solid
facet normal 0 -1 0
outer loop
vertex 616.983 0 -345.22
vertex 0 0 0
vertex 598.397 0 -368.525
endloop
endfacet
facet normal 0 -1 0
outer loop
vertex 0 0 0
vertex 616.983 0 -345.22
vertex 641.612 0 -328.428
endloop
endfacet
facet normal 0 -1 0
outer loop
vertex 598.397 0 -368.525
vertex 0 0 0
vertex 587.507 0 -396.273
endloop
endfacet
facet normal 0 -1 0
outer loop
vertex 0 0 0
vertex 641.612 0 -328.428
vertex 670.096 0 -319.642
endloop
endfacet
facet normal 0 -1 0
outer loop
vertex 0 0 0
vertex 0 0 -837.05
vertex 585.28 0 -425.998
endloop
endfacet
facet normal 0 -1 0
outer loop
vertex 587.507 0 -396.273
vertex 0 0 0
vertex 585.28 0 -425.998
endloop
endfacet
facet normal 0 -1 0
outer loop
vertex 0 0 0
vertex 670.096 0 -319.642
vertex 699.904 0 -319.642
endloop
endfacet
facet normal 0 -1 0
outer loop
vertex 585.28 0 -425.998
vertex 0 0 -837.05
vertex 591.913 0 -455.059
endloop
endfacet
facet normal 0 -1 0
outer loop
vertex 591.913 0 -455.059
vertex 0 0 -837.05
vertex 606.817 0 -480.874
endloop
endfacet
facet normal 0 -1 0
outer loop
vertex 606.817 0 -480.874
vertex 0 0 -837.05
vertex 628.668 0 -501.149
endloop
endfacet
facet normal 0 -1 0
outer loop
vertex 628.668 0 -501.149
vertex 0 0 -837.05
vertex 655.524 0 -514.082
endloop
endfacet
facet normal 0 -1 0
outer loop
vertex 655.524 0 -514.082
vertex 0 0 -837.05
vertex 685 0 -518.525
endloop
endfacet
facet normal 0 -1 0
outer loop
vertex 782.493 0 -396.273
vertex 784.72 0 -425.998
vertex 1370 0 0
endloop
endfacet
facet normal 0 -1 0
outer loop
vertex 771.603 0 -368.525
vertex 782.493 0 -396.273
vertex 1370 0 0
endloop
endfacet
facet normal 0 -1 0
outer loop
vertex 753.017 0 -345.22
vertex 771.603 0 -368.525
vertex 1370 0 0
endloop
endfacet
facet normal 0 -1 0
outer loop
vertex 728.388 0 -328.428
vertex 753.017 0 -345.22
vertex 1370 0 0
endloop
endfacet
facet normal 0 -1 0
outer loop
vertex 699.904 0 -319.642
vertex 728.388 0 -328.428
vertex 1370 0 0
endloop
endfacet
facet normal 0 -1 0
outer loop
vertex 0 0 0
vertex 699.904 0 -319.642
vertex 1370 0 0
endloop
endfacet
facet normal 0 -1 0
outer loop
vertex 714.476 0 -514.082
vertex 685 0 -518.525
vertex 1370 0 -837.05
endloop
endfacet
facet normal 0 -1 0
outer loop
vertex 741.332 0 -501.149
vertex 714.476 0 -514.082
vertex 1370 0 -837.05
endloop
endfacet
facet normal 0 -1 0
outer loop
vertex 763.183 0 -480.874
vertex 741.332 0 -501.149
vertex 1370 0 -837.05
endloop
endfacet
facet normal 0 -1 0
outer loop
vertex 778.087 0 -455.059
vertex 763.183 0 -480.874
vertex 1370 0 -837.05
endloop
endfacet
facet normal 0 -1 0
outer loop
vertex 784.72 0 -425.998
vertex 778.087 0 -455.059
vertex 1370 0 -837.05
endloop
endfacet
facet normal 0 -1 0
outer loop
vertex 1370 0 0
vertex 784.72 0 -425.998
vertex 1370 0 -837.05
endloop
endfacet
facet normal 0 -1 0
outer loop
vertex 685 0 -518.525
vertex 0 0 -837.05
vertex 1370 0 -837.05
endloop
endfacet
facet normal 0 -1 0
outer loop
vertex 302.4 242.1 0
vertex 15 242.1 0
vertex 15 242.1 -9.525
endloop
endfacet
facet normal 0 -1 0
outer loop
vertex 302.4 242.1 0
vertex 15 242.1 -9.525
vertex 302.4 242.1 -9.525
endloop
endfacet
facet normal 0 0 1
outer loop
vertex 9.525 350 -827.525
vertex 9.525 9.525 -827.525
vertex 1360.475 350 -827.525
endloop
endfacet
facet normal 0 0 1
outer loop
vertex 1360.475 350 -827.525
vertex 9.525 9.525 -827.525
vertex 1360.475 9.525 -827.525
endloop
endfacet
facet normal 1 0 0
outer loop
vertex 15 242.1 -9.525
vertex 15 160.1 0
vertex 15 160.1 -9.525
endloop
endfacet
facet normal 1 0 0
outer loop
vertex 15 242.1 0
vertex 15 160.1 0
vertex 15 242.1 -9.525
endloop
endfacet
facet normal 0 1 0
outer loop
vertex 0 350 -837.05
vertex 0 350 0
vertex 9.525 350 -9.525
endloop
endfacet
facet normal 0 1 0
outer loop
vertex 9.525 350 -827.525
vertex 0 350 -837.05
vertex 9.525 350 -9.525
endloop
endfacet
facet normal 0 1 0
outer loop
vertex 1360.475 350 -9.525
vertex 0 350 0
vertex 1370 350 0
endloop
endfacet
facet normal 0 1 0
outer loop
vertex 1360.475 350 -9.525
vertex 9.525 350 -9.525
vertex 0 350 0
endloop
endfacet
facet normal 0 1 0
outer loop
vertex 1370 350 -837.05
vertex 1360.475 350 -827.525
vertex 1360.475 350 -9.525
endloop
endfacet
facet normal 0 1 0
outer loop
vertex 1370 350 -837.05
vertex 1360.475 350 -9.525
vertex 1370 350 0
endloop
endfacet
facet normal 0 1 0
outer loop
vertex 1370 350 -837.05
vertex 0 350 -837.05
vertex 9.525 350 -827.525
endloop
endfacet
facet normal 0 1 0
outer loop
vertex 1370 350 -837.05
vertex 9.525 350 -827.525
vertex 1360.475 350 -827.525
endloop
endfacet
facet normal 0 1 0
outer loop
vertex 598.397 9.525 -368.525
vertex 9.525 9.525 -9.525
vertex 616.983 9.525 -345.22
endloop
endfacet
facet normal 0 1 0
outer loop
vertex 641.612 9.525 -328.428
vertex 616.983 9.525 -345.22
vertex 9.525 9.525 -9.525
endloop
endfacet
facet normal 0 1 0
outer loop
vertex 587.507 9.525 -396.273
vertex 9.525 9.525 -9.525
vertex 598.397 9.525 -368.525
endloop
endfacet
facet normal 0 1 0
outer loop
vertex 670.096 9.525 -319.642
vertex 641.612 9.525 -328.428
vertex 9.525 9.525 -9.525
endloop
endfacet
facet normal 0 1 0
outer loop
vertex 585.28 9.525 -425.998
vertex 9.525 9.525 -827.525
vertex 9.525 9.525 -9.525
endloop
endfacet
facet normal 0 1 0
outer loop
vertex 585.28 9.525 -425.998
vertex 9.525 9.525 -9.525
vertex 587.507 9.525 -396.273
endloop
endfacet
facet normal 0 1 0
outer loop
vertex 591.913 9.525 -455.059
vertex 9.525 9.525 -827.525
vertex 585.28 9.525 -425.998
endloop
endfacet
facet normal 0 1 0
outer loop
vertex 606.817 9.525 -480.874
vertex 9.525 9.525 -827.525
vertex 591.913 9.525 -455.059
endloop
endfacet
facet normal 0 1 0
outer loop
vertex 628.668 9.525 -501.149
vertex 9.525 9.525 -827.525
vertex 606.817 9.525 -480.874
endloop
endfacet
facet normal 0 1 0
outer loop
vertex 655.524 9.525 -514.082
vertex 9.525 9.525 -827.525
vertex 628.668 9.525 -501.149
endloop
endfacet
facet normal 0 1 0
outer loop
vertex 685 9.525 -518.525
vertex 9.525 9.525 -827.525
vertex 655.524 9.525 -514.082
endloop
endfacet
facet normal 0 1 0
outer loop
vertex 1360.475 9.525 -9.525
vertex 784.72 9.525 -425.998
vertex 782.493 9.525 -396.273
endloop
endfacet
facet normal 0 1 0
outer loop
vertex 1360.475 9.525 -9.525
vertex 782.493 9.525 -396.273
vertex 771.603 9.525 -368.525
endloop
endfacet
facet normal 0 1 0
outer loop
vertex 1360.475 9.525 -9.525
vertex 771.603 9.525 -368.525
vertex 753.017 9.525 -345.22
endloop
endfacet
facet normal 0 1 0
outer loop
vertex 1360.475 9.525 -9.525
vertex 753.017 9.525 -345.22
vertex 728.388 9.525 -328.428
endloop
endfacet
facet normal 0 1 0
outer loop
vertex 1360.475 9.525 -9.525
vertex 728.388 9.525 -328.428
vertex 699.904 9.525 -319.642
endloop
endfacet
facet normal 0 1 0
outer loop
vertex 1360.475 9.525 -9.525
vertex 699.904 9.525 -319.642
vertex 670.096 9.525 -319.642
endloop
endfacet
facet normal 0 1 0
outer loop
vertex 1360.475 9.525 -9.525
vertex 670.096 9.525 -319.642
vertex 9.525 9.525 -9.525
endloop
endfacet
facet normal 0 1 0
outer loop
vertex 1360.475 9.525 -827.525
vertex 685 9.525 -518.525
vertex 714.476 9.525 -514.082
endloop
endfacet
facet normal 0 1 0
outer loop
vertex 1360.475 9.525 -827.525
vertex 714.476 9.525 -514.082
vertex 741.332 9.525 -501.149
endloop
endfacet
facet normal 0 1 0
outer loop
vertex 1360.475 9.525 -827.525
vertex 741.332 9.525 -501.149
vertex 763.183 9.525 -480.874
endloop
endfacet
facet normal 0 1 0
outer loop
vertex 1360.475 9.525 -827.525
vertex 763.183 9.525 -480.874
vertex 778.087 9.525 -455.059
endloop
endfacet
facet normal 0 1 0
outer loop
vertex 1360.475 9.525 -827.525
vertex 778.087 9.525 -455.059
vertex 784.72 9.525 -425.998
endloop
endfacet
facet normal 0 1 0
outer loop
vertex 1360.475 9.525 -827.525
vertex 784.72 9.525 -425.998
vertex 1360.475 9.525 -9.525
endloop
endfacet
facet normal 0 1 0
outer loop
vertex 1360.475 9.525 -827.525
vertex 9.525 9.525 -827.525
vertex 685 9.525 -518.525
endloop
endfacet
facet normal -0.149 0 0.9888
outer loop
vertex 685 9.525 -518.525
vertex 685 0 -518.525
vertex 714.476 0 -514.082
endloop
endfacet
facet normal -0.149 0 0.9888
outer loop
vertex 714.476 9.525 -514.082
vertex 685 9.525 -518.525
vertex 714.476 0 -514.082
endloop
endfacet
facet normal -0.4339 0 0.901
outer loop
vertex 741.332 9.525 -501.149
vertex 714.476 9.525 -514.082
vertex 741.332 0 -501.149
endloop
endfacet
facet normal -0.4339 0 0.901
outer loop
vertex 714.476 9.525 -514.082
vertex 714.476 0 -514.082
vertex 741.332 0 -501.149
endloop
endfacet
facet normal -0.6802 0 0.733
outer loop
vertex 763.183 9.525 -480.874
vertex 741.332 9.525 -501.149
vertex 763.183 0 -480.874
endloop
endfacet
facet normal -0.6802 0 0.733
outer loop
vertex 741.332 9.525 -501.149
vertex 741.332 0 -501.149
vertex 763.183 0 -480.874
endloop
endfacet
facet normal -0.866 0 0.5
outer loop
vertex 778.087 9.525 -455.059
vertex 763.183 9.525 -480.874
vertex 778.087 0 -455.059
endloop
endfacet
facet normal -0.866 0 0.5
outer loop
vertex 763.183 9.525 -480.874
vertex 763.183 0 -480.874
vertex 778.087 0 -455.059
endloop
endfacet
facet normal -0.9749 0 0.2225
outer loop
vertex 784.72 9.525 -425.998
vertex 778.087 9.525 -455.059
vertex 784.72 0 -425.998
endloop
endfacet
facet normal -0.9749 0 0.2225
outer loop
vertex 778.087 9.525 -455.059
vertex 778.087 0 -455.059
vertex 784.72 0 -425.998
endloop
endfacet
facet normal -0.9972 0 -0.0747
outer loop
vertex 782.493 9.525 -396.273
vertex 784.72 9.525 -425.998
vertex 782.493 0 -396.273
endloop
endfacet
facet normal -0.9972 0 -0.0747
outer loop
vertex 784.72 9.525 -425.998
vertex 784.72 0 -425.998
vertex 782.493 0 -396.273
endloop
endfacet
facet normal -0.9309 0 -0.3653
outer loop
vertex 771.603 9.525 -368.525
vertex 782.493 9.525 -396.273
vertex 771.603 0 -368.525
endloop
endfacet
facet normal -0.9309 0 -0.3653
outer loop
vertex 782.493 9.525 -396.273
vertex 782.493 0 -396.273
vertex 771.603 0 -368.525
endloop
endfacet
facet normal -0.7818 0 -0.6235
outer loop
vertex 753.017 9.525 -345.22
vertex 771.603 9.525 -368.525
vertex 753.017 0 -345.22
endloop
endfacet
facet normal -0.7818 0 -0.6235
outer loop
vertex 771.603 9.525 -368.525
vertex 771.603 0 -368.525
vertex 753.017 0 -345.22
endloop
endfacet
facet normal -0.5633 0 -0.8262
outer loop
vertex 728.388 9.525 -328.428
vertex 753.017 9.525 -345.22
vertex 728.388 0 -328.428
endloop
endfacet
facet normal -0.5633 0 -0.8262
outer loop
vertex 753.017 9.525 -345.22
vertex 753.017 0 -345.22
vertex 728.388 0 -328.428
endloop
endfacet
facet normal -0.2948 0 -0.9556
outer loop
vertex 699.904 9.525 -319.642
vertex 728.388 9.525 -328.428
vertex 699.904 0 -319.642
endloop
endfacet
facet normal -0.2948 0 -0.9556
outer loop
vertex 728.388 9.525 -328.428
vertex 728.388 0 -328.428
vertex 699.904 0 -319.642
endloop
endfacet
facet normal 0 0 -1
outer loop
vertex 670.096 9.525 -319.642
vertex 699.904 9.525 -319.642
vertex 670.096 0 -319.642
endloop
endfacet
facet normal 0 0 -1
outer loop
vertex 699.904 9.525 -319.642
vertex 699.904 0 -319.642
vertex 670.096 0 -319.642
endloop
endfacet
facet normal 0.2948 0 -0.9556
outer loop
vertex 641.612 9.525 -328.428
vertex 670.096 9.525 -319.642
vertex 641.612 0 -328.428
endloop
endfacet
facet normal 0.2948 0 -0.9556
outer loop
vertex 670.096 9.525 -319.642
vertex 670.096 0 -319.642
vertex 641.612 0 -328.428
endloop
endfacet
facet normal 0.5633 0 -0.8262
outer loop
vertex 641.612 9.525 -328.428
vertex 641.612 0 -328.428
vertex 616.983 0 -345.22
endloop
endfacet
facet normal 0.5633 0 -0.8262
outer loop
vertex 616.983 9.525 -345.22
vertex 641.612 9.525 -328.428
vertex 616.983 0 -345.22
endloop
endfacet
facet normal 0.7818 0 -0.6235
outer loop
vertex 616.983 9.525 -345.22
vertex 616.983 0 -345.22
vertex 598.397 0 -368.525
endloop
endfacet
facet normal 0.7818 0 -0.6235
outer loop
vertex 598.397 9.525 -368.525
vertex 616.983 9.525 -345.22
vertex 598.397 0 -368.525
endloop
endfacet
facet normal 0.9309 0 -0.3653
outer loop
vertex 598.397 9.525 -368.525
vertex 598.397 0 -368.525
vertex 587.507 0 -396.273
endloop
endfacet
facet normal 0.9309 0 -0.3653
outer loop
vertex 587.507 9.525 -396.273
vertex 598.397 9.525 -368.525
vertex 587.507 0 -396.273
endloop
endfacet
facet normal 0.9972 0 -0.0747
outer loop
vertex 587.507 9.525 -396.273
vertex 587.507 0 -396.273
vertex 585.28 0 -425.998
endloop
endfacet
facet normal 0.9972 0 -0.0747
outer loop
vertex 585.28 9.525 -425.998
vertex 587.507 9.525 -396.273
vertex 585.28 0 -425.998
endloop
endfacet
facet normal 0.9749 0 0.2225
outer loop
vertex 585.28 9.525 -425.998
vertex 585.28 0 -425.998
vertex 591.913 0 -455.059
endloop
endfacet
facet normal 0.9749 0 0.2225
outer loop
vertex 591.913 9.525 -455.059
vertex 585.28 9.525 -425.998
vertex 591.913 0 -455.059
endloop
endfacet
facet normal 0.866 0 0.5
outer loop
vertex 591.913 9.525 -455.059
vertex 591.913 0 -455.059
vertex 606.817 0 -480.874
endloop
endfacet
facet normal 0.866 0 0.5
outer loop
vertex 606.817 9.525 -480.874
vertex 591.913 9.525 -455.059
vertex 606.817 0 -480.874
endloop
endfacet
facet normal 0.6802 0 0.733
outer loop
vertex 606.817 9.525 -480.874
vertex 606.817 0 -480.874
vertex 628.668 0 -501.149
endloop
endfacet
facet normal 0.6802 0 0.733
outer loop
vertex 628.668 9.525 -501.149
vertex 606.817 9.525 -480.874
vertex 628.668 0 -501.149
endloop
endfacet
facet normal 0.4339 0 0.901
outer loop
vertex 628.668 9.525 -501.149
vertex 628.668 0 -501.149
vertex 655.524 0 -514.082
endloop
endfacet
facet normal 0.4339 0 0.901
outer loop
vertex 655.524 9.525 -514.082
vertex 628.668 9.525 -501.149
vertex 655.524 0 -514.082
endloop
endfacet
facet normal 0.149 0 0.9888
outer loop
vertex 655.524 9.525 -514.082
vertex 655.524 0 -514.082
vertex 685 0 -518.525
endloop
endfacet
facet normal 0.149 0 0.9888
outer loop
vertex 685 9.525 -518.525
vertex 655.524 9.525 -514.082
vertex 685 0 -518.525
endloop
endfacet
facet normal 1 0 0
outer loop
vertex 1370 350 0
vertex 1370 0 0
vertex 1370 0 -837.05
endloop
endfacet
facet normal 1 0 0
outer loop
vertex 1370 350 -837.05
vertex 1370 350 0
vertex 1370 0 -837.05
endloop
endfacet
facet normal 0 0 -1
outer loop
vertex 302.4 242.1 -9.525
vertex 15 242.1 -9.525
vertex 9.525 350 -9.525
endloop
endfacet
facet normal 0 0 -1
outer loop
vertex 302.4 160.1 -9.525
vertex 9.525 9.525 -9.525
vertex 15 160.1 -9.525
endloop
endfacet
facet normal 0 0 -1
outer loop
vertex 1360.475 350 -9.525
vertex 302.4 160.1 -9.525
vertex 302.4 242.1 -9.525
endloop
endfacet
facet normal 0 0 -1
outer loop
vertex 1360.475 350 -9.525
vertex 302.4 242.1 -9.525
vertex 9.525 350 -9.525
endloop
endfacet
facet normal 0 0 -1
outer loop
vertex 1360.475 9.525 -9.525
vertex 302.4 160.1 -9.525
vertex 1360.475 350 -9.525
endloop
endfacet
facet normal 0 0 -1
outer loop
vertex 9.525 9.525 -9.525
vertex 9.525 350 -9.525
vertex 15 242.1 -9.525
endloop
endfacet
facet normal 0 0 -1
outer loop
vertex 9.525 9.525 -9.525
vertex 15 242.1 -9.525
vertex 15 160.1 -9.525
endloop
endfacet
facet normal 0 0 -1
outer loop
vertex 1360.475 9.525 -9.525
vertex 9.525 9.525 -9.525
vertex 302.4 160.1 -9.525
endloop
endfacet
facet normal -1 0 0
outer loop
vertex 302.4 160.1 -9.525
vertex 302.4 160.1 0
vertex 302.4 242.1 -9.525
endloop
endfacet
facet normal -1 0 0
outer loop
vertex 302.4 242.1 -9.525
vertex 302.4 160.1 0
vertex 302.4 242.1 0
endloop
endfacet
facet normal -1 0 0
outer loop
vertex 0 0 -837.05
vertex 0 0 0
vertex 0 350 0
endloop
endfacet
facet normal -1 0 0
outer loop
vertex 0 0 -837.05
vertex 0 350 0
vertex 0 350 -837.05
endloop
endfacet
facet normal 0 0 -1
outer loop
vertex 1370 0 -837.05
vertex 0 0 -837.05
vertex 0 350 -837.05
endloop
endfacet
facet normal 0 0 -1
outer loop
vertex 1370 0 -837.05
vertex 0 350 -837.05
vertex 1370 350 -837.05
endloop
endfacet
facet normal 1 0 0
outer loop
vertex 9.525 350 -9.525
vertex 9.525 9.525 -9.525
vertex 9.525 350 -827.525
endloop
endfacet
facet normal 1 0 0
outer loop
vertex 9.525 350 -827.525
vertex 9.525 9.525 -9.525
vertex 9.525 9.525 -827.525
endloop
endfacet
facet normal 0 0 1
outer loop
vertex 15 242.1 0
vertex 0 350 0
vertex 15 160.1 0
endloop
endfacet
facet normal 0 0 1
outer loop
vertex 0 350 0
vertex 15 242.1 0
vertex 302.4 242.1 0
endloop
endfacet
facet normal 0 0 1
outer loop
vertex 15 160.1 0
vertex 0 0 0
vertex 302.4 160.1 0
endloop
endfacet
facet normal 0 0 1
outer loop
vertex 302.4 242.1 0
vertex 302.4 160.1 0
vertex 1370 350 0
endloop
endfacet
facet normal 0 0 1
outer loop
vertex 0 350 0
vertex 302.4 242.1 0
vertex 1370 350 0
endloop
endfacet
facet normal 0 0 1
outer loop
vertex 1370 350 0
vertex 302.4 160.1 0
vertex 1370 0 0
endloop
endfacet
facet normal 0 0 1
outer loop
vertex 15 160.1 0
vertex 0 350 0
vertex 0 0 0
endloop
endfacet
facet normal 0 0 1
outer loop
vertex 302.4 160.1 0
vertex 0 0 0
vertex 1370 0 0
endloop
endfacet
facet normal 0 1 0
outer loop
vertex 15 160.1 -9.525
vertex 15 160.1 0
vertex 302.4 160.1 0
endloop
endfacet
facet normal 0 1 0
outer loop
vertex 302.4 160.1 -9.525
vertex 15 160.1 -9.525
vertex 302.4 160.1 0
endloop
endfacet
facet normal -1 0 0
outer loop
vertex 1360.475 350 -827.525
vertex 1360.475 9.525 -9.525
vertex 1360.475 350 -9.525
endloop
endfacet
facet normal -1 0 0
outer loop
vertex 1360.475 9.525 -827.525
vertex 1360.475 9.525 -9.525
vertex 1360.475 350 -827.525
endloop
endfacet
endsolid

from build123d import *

# Parameters (mm, degrees)
SKETCH1_W           = 1370
SKETCH1_H           = 837.05
BOSS_EXTRUDE1_DEPTH = 350
SHELL1_T            = -9.525
SKETCH3_W           = 287.4
SKETCH3_H           = 82
CUT_EXTRUDE1_DEPTH  = 9.525
CUT_EXTRUDE2_REACH  = 1645.184
SKETCH7_R           = 100


with BuildPart() as part:
    # Sketch1 → Boss-Extrude1 (new body)
    with BuildSketch(Plane(origin=(0, 0, 0), x_dir=(1, 0, 0), z_dir=(0, 1, 0))):
        with Locations((685, 418.525)):
            Rectangle(SKETCH1_W, SKETCH1_H)
    extrude(amount=BOSS_EXTRUDE1_DEPTH)

    # Shell1
    shell1_openings = [part.faces().sort_by_distance(p)[0] for p in [
        (685, 350, -418.525),
    ]]
    offset(amount=SHELL1_T, openings=shell1_openings, kind=Kind.INTERSECTION)

    # Sketch3 → Cut-Extrude1 (cut)
    with BuildSketch(Plane.XY):
        with Locations((158.7, 201.1)):
            Rectangle(SKETCH3_W, SKETCH3_H)
    extrude(amount=-CUT_EXTRUDE1_DEPTH, mode=Mode.SUBTRACT)

    # Sketch7 → Cut-Extrude2 (cut, up to next)
    with BuildSketch(Plane.XZ, mode=Mode.PRIVATE) as cut_extrude2_sk1:
        with Locations(Location((685, -418.525, 0), (0, 0, 270))):
            Circle(SKETCH7_R)
    cut_extrude2_tool1 = extrude(cut_extrude2_sk1.sketch, amount=-CUT_EXTRUDE2_REACH, mode=Mode.PRIVATE) & part.part
    add(cut_extrude2_tool1.solids().sort_by_distance((685, 0, -418.525))[0], mode=Mode.SUBTRACT)


solid = part.part
